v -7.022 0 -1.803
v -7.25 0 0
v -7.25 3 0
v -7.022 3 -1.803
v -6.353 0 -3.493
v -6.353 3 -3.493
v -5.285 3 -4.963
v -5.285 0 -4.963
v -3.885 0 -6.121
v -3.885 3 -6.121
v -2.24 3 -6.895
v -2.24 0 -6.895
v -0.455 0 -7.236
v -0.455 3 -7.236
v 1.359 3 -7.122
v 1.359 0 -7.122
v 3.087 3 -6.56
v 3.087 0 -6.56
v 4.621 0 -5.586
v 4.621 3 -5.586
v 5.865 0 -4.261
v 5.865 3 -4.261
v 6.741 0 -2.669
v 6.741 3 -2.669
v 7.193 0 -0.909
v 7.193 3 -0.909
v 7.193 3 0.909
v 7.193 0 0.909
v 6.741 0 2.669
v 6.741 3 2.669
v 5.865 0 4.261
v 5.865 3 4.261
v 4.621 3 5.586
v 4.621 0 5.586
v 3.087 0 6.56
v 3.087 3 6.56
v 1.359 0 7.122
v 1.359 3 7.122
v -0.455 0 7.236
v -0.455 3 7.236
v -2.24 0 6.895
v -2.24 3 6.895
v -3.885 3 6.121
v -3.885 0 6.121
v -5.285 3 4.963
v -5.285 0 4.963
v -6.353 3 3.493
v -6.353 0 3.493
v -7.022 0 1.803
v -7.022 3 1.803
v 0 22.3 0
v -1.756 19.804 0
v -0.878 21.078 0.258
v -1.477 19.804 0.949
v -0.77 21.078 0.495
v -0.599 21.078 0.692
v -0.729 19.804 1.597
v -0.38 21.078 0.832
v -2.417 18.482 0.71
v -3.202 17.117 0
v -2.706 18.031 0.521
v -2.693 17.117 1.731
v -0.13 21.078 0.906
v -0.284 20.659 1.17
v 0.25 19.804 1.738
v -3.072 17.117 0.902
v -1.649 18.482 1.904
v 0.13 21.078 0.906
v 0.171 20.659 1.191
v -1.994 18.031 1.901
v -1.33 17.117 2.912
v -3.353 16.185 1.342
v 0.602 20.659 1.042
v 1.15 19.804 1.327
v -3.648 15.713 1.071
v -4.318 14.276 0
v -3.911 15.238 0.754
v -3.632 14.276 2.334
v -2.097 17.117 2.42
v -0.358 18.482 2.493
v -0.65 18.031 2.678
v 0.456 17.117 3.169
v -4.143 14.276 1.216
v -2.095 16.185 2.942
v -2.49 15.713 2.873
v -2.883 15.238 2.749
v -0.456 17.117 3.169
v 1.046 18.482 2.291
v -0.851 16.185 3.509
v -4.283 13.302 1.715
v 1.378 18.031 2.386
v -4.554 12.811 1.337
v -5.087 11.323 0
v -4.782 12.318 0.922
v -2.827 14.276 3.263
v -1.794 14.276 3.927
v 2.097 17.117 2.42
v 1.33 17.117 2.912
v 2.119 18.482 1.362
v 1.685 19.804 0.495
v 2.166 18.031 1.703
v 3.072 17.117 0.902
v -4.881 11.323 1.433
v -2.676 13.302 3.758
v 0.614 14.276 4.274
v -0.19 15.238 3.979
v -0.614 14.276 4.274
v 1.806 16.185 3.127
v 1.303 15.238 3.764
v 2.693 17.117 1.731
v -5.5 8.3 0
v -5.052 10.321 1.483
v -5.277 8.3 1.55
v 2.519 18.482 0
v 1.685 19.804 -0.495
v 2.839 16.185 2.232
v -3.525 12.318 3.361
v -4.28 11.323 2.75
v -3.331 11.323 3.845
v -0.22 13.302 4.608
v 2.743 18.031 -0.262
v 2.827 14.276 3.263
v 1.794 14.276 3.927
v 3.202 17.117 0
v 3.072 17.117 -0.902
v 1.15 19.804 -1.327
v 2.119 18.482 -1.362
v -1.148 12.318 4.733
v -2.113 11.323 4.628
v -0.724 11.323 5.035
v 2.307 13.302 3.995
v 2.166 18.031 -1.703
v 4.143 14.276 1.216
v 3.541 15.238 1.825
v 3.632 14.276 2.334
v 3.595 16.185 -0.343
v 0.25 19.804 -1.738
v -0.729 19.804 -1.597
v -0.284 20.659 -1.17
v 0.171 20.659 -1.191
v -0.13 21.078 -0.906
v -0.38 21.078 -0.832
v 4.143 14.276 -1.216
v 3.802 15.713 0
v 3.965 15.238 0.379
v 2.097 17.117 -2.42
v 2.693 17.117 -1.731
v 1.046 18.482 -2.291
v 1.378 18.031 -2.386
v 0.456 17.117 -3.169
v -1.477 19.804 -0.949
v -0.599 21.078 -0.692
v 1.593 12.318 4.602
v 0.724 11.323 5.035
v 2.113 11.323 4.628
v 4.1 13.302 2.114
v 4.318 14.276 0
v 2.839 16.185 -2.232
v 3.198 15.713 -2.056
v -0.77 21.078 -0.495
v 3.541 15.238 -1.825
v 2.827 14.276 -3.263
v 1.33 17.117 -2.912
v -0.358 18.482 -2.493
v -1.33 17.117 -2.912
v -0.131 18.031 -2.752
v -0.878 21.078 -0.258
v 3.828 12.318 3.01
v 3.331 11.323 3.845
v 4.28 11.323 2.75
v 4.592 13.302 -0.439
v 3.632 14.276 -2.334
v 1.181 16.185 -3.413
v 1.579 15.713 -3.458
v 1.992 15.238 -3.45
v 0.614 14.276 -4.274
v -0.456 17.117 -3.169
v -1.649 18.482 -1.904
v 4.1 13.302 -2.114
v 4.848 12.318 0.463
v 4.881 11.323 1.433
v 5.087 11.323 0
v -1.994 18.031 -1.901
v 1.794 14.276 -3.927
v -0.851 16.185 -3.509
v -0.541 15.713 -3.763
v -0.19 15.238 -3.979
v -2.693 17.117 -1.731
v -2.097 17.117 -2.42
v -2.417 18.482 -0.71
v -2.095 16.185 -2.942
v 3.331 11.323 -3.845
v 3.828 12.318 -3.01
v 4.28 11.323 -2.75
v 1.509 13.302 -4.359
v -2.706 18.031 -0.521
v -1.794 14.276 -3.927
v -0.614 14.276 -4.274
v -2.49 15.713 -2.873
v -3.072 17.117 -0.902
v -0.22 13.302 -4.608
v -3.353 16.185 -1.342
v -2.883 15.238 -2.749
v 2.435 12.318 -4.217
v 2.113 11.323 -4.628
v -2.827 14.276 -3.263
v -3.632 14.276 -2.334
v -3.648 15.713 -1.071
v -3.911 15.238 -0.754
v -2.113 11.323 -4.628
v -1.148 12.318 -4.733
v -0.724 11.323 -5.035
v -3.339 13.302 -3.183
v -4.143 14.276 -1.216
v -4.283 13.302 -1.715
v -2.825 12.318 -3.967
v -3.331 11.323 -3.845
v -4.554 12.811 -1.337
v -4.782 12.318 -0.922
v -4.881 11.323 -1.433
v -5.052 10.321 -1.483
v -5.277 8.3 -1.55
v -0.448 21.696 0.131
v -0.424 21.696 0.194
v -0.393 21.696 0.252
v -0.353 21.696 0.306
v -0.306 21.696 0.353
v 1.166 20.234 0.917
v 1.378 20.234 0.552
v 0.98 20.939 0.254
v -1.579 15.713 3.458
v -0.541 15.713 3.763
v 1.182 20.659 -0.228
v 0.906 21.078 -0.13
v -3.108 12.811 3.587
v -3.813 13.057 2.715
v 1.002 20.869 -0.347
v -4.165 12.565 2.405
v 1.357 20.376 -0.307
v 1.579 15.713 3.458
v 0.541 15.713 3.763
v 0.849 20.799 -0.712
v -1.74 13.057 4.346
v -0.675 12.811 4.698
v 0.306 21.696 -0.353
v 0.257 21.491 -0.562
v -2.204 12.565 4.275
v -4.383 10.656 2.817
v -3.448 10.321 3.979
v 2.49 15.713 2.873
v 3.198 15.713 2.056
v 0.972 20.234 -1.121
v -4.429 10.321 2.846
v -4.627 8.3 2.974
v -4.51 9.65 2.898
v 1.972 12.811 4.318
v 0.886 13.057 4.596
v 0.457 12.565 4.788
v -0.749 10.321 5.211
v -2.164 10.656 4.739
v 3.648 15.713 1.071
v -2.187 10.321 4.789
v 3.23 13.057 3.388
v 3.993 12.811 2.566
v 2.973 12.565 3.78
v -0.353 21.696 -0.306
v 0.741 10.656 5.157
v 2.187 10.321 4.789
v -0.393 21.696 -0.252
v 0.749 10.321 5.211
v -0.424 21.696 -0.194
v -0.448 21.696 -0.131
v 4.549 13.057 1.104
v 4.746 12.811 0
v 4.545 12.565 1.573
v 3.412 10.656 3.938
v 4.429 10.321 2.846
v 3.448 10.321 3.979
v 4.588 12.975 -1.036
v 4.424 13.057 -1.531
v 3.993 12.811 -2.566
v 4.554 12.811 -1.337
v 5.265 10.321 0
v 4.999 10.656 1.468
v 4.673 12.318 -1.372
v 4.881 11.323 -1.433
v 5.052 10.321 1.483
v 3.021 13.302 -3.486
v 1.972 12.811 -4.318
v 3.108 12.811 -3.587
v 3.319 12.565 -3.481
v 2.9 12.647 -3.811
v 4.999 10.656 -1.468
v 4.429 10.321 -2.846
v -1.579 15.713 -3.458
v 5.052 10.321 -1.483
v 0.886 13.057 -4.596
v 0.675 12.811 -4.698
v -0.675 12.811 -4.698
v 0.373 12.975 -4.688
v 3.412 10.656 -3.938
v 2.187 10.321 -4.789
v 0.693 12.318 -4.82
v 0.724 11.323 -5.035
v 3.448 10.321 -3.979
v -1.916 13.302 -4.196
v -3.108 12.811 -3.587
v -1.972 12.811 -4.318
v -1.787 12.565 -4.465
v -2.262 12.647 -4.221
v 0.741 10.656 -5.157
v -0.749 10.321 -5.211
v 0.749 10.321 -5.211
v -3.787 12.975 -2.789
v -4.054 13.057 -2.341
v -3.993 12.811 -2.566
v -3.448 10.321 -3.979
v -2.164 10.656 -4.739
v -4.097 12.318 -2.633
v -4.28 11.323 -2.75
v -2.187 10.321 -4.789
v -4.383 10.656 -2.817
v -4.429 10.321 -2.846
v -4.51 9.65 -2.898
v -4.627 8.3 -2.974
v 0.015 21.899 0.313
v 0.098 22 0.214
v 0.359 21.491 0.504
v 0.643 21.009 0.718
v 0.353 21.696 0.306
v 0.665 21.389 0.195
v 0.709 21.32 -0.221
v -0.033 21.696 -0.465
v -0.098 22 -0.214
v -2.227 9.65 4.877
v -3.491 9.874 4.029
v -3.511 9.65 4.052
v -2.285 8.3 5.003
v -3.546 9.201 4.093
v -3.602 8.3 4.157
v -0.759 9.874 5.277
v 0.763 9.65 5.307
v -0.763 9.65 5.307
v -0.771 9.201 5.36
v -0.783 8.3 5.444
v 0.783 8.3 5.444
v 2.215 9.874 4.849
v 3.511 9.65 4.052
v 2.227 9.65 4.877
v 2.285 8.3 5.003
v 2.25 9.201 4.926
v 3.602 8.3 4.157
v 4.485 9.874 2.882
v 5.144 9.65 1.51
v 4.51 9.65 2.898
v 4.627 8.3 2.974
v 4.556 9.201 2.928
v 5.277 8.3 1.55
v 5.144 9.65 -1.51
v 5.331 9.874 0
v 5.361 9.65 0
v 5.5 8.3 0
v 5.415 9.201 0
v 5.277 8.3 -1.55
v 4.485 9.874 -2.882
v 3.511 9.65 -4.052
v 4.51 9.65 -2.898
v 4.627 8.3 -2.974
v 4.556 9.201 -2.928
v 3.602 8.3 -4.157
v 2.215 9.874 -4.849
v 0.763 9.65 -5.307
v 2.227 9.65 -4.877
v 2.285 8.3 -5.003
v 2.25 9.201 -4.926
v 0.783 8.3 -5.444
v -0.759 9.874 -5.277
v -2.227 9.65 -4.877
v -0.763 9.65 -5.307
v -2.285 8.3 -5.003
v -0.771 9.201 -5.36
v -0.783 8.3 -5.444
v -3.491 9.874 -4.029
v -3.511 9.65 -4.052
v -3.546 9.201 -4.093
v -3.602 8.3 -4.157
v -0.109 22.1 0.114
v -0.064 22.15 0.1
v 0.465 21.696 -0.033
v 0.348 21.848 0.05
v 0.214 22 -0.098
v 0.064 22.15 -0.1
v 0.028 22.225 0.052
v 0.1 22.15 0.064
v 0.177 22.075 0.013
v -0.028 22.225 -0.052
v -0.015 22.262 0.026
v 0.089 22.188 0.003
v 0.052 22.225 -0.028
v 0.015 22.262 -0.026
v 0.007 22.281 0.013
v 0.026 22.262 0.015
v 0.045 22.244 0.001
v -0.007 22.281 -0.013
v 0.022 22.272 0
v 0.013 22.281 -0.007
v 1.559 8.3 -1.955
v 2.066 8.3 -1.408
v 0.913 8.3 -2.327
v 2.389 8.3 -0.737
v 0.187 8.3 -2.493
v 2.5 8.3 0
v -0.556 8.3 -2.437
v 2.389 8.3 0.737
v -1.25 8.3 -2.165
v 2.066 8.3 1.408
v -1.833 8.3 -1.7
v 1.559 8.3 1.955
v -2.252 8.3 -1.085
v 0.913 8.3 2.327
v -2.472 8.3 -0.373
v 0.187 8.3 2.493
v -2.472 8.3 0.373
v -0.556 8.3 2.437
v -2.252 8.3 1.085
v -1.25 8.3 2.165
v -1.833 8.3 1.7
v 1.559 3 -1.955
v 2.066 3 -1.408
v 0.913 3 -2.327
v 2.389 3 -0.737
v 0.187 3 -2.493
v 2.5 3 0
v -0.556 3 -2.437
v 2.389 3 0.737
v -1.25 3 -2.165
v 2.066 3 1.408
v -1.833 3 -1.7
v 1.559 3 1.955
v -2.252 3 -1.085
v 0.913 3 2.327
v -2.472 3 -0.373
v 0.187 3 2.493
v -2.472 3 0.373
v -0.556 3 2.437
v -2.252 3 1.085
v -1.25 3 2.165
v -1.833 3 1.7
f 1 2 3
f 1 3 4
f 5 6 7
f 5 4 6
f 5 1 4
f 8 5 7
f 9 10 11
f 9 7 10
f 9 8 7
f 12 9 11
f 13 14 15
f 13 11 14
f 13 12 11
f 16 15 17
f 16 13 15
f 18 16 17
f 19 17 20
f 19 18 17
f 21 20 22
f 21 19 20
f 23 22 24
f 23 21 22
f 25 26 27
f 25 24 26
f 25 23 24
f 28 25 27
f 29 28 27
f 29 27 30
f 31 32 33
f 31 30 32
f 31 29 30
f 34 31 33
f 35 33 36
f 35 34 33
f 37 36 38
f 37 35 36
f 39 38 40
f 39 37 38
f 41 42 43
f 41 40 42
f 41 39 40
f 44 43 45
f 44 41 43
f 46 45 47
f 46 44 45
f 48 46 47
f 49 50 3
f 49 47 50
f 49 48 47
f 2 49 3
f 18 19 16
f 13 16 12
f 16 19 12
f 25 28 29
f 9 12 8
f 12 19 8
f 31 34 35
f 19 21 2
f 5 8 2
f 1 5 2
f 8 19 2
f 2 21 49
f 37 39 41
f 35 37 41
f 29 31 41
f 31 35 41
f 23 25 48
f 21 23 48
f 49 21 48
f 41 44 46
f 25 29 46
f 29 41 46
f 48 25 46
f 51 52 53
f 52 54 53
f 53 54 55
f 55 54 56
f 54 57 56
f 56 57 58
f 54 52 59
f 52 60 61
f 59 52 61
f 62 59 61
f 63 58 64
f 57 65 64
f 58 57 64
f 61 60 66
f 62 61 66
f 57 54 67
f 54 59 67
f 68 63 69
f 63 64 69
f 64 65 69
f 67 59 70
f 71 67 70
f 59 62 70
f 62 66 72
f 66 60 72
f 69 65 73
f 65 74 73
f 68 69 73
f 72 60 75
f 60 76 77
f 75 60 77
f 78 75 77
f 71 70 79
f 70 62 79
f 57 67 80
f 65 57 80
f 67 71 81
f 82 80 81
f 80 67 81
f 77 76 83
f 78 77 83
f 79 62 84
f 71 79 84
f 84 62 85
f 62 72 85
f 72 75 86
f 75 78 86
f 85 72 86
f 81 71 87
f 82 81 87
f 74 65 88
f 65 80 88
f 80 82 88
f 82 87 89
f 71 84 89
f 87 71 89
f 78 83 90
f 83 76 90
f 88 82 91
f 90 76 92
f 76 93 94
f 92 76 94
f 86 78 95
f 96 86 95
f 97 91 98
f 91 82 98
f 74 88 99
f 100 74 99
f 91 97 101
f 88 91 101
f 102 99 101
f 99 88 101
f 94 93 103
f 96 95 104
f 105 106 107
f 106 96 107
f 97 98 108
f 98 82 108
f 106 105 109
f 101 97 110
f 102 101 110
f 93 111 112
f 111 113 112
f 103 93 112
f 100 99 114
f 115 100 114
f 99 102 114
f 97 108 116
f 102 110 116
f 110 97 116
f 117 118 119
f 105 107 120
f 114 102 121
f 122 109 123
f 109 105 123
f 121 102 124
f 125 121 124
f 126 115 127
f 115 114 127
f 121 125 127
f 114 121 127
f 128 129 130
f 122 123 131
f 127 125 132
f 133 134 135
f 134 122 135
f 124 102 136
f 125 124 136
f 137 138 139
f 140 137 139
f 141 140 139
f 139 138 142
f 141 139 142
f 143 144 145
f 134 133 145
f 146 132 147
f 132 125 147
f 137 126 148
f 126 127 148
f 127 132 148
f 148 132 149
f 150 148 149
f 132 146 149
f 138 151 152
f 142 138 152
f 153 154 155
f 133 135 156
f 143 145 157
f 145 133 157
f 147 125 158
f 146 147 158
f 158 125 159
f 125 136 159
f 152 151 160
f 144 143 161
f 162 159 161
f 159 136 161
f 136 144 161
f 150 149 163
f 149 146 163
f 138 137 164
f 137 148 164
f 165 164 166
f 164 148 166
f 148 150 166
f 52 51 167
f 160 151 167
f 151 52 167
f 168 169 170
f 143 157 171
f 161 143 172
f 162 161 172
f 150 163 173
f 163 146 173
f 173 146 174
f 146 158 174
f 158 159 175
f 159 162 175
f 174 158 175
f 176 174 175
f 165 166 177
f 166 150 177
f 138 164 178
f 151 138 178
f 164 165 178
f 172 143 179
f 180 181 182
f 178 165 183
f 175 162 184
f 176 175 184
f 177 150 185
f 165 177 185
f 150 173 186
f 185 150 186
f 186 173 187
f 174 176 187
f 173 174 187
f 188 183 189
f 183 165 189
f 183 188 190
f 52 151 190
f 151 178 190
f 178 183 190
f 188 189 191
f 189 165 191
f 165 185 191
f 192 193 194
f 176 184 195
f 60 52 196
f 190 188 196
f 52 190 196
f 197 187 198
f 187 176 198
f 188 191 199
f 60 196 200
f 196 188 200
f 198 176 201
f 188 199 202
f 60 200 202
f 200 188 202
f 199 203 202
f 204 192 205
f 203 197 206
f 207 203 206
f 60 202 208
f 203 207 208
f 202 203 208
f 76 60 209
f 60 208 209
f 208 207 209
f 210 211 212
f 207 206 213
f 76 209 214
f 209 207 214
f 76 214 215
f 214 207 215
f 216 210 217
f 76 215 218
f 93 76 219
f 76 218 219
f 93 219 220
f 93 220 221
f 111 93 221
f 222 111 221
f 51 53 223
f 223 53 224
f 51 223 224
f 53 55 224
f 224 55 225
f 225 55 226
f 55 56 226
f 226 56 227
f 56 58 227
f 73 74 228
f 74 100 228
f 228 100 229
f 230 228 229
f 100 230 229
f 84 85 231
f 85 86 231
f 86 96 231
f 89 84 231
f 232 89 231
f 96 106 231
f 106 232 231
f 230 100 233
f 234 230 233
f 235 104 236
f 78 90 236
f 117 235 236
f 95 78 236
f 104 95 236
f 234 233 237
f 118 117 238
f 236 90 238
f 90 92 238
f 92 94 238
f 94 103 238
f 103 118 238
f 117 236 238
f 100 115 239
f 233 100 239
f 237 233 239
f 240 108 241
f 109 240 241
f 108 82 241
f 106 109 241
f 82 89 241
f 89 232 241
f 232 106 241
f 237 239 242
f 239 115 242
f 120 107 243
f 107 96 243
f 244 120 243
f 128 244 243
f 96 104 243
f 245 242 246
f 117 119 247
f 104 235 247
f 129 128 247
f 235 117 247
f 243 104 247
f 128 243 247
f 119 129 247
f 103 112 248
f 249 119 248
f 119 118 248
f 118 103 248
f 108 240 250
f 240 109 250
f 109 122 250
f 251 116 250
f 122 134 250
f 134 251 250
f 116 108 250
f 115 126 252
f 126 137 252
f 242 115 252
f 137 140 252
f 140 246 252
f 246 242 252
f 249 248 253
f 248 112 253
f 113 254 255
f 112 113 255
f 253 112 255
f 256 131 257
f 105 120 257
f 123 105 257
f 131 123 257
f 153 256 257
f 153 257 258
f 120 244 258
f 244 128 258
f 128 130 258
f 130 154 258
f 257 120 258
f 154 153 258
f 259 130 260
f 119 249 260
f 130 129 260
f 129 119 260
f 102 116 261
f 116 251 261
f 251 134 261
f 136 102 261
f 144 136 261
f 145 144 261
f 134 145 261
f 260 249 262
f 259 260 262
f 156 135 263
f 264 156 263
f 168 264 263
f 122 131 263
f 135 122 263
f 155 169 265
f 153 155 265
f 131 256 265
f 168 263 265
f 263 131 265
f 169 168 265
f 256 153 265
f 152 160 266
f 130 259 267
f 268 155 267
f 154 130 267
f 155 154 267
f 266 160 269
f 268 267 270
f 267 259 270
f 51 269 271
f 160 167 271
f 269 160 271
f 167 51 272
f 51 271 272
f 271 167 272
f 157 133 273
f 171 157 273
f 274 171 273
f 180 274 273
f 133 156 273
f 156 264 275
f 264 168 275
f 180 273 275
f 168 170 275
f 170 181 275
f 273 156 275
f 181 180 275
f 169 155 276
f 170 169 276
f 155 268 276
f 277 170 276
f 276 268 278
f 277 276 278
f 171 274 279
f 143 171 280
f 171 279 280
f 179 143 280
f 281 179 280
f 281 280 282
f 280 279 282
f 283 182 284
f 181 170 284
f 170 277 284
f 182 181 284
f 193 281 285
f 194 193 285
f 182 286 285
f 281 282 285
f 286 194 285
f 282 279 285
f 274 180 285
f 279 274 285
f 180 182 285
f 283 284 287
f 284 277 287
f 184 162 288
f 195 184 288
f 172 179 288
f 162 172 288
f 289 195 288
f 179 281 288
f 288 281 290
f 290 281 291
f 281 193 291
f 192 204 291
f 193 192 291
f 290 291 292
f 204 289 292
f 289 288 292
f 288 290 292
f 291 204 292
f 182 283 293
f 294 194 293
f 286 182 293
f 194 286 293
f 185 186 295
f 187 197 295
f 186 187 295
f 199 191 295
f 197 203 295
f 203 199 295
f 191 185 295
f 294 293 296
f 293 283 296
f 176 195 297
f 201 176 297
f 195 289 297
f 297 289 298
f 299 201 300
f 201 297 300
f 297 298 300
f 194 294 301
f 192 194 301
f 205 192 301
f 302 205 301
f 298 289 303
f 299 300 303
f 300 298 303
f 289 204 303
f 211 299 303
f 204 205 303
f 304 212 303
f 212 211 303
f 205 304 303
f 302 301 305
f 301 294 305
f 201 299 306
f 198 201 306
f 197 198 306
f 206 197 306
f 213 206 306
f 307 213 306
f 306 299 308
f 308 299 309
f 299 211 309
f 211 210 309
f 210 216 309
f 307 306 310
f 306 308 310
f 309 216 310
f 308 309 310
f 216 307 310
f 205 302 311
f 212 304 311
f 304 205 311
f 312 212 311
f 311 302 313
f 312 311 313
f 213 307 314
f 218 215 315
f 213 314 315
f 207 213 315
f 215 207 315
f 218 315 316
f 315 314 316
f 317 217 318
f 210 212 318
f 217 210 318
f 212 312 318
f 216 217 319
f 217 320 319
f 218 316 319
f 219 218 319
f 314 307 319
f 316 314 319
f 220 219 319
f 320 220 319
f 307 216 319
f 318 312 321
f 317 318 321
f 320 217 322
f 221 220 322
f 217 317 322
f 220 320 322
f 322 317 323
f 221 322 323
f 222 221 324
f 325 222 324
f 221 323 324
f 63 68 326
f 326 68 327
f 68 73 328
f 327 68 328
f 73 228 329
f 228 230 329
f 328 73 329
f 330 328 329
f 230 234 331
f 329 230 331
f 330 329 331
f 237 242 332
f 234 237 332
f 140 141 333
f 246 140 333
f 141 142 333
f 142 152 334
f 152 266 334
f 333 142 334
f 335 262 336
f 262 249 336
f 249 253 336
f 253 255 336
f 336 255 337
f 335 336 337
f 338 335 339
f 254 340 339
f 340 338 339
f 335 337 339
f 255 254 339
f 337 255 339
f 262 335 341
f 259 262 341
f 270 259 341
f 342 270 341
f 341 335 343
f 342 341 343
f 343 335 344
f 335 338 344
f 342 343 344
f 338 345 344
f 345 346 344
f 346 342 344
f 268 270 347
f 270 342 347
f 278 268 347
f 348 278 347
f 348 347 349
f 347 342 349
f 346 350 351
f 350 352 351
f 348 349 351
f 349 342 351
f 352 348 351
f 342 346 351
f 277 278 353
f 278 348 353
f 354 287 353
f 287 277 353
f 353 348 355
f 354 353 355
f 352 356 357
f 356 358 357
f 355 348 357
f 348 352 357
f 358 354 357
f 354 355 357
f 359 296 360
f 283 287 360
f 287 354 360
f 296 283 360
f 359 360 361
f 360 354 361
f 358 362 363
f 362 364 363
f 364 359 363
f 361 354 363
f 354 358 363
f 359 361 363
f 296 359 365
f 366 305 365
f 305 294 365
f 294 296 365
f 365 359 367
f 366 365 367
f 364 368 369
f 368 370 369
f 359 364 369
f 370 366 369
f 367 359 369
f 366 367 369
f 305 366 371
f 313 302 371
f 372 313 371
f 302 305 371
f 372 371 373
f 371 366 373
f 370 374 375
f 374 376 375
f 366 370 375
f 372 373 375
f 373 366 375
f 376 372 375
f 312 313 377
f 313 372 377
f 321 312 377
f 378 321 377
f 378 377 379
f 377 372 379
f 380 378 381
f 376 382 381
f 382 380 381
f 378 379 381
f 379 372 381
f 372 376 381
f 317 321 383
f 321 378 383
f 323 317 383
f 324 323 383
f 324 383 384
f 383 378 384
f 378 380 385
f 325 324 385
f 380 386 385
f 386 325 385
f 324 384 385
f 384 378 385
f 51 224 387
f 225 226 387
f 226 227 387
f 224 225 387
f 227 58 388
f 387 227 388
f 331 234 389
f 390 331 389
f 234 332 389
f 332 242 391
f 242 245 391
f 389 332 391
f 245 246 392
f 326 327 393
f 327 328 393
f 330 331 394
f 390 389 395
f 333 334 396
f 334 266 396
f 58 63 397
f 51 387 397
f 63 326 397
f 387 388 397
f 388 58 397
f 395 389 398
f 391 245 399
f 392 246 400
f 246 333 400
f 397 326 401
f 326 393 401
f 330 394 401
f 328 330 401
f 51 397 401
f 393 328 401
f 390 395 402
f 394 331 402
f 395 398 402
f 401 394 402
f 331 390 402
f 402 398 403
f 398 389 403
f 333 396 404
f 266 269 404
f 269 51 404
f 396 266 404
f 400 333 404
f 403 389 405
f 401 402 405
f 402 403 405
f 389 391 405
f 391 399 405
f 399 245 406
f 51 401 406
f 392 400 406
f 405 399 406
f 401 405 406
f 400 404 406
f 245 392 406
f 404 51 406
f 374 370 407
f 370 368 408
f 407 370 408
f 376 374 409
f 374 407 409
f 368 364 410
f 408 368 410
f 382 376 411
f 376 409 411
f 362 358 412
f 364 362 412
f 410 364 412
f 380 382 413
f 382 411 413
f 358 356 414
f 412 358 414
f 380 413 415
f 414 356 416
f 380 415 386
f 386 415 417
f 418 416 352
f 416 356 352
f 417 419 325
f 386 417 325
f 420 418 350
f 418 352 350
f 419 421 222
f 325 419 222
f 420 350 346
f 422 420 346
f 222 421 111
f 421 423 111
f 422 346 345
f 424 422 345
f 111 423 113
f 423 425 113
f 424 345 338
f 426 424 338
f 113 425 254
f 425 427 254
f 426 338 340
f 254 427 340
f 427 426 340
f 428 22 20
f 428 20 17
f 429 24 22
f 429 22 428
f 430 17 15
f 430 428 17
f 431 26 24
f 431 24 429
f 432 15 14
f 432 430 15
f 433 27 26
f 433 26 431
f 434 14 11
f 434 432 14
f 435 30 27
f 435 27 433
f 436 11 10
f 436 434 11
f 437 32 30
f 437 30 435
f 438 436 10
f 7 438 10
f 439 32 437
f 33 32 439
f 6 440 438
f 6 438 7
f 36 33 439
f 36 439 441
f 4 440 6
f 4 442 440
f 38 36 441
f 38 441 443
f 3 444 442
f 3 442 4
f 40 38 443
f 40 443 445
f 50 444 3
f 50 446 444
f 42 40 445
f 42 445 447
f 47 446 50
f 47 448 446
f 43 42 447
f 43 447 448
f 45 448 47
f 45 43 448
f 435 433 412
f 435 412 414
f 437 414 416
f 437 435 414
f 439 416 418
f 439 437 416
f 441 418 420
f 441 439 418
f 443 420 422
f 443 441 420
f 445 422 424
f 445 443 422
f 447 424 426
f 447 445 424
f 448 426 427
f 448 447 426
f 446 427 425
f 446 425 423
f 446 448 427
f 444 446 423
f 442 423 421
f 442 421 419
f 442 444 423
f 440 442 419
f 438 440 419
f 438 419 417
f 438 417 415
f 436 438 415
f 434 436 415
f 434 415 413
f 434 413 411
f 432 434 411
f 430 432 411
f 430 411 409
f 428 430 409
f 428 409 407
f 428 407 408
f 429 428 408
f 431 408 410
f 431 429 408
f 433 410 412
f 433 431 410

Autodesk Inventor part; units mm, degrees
ref_plane "YZ Plane" through (0, 0, 0) normal (1, 0, 0) x (0, 1, 0)
ref_plane "XZ Plane" through (0, 0, 0) normal (0, 1, 0) x (-1, 0, 0)
sketch "Sketch1" plane through (0, 0, 0) normal (0, 1, 0) x (-1, 0, 0)
  circle A0 centre (0, 0) radius 7.25
  dimension "d0" = 14.5
extrude "Extrusion1" add sketch "Sketch1" along normal blind 3
sketch "Sketch2" plane through (0, 3, 0) normal (0, 1, 0) x (1, 0, 0)
  circle A0 centre (0, 0) radius 2.5
  dimension "d3" = 5
extrude "Extrusion2" add sketch "Sketch2" along normal blind 14.7
ref_plane "Work Plane1" through (0, 8.3, 0) normal (0, 1, 0) x (1, 0, 0)
sketch "Sketch4" plane through (0, 0, 0) normal (0, 0, 1) x (1, 0, 0)
  line L0 (0, 0) -> (0, 8.2998)
  line L1 (0, 8.2998) -> (-5.5, 8.2998)
  line L2 (2.5, 17.7) -> (-2.5, 17.7) projected
  line L3 (0, 22.2998) -> (0, 8.2998)
  arc A0 (0, 22.2998) -> (-5.5, 8.2998) centre (20.0135, 6.357) ccw
  line L4 (0, 22.2998) -> (0, 30.2311)
  dimension "d8" = 5.5
  dimension "d9" = 14
revolve "Revolution1" add sketch "Sketch4" angle 360 about axis through (0, 22.2998, 0) along (0, 1, 0)
properties part number "MotorMountingHub"
